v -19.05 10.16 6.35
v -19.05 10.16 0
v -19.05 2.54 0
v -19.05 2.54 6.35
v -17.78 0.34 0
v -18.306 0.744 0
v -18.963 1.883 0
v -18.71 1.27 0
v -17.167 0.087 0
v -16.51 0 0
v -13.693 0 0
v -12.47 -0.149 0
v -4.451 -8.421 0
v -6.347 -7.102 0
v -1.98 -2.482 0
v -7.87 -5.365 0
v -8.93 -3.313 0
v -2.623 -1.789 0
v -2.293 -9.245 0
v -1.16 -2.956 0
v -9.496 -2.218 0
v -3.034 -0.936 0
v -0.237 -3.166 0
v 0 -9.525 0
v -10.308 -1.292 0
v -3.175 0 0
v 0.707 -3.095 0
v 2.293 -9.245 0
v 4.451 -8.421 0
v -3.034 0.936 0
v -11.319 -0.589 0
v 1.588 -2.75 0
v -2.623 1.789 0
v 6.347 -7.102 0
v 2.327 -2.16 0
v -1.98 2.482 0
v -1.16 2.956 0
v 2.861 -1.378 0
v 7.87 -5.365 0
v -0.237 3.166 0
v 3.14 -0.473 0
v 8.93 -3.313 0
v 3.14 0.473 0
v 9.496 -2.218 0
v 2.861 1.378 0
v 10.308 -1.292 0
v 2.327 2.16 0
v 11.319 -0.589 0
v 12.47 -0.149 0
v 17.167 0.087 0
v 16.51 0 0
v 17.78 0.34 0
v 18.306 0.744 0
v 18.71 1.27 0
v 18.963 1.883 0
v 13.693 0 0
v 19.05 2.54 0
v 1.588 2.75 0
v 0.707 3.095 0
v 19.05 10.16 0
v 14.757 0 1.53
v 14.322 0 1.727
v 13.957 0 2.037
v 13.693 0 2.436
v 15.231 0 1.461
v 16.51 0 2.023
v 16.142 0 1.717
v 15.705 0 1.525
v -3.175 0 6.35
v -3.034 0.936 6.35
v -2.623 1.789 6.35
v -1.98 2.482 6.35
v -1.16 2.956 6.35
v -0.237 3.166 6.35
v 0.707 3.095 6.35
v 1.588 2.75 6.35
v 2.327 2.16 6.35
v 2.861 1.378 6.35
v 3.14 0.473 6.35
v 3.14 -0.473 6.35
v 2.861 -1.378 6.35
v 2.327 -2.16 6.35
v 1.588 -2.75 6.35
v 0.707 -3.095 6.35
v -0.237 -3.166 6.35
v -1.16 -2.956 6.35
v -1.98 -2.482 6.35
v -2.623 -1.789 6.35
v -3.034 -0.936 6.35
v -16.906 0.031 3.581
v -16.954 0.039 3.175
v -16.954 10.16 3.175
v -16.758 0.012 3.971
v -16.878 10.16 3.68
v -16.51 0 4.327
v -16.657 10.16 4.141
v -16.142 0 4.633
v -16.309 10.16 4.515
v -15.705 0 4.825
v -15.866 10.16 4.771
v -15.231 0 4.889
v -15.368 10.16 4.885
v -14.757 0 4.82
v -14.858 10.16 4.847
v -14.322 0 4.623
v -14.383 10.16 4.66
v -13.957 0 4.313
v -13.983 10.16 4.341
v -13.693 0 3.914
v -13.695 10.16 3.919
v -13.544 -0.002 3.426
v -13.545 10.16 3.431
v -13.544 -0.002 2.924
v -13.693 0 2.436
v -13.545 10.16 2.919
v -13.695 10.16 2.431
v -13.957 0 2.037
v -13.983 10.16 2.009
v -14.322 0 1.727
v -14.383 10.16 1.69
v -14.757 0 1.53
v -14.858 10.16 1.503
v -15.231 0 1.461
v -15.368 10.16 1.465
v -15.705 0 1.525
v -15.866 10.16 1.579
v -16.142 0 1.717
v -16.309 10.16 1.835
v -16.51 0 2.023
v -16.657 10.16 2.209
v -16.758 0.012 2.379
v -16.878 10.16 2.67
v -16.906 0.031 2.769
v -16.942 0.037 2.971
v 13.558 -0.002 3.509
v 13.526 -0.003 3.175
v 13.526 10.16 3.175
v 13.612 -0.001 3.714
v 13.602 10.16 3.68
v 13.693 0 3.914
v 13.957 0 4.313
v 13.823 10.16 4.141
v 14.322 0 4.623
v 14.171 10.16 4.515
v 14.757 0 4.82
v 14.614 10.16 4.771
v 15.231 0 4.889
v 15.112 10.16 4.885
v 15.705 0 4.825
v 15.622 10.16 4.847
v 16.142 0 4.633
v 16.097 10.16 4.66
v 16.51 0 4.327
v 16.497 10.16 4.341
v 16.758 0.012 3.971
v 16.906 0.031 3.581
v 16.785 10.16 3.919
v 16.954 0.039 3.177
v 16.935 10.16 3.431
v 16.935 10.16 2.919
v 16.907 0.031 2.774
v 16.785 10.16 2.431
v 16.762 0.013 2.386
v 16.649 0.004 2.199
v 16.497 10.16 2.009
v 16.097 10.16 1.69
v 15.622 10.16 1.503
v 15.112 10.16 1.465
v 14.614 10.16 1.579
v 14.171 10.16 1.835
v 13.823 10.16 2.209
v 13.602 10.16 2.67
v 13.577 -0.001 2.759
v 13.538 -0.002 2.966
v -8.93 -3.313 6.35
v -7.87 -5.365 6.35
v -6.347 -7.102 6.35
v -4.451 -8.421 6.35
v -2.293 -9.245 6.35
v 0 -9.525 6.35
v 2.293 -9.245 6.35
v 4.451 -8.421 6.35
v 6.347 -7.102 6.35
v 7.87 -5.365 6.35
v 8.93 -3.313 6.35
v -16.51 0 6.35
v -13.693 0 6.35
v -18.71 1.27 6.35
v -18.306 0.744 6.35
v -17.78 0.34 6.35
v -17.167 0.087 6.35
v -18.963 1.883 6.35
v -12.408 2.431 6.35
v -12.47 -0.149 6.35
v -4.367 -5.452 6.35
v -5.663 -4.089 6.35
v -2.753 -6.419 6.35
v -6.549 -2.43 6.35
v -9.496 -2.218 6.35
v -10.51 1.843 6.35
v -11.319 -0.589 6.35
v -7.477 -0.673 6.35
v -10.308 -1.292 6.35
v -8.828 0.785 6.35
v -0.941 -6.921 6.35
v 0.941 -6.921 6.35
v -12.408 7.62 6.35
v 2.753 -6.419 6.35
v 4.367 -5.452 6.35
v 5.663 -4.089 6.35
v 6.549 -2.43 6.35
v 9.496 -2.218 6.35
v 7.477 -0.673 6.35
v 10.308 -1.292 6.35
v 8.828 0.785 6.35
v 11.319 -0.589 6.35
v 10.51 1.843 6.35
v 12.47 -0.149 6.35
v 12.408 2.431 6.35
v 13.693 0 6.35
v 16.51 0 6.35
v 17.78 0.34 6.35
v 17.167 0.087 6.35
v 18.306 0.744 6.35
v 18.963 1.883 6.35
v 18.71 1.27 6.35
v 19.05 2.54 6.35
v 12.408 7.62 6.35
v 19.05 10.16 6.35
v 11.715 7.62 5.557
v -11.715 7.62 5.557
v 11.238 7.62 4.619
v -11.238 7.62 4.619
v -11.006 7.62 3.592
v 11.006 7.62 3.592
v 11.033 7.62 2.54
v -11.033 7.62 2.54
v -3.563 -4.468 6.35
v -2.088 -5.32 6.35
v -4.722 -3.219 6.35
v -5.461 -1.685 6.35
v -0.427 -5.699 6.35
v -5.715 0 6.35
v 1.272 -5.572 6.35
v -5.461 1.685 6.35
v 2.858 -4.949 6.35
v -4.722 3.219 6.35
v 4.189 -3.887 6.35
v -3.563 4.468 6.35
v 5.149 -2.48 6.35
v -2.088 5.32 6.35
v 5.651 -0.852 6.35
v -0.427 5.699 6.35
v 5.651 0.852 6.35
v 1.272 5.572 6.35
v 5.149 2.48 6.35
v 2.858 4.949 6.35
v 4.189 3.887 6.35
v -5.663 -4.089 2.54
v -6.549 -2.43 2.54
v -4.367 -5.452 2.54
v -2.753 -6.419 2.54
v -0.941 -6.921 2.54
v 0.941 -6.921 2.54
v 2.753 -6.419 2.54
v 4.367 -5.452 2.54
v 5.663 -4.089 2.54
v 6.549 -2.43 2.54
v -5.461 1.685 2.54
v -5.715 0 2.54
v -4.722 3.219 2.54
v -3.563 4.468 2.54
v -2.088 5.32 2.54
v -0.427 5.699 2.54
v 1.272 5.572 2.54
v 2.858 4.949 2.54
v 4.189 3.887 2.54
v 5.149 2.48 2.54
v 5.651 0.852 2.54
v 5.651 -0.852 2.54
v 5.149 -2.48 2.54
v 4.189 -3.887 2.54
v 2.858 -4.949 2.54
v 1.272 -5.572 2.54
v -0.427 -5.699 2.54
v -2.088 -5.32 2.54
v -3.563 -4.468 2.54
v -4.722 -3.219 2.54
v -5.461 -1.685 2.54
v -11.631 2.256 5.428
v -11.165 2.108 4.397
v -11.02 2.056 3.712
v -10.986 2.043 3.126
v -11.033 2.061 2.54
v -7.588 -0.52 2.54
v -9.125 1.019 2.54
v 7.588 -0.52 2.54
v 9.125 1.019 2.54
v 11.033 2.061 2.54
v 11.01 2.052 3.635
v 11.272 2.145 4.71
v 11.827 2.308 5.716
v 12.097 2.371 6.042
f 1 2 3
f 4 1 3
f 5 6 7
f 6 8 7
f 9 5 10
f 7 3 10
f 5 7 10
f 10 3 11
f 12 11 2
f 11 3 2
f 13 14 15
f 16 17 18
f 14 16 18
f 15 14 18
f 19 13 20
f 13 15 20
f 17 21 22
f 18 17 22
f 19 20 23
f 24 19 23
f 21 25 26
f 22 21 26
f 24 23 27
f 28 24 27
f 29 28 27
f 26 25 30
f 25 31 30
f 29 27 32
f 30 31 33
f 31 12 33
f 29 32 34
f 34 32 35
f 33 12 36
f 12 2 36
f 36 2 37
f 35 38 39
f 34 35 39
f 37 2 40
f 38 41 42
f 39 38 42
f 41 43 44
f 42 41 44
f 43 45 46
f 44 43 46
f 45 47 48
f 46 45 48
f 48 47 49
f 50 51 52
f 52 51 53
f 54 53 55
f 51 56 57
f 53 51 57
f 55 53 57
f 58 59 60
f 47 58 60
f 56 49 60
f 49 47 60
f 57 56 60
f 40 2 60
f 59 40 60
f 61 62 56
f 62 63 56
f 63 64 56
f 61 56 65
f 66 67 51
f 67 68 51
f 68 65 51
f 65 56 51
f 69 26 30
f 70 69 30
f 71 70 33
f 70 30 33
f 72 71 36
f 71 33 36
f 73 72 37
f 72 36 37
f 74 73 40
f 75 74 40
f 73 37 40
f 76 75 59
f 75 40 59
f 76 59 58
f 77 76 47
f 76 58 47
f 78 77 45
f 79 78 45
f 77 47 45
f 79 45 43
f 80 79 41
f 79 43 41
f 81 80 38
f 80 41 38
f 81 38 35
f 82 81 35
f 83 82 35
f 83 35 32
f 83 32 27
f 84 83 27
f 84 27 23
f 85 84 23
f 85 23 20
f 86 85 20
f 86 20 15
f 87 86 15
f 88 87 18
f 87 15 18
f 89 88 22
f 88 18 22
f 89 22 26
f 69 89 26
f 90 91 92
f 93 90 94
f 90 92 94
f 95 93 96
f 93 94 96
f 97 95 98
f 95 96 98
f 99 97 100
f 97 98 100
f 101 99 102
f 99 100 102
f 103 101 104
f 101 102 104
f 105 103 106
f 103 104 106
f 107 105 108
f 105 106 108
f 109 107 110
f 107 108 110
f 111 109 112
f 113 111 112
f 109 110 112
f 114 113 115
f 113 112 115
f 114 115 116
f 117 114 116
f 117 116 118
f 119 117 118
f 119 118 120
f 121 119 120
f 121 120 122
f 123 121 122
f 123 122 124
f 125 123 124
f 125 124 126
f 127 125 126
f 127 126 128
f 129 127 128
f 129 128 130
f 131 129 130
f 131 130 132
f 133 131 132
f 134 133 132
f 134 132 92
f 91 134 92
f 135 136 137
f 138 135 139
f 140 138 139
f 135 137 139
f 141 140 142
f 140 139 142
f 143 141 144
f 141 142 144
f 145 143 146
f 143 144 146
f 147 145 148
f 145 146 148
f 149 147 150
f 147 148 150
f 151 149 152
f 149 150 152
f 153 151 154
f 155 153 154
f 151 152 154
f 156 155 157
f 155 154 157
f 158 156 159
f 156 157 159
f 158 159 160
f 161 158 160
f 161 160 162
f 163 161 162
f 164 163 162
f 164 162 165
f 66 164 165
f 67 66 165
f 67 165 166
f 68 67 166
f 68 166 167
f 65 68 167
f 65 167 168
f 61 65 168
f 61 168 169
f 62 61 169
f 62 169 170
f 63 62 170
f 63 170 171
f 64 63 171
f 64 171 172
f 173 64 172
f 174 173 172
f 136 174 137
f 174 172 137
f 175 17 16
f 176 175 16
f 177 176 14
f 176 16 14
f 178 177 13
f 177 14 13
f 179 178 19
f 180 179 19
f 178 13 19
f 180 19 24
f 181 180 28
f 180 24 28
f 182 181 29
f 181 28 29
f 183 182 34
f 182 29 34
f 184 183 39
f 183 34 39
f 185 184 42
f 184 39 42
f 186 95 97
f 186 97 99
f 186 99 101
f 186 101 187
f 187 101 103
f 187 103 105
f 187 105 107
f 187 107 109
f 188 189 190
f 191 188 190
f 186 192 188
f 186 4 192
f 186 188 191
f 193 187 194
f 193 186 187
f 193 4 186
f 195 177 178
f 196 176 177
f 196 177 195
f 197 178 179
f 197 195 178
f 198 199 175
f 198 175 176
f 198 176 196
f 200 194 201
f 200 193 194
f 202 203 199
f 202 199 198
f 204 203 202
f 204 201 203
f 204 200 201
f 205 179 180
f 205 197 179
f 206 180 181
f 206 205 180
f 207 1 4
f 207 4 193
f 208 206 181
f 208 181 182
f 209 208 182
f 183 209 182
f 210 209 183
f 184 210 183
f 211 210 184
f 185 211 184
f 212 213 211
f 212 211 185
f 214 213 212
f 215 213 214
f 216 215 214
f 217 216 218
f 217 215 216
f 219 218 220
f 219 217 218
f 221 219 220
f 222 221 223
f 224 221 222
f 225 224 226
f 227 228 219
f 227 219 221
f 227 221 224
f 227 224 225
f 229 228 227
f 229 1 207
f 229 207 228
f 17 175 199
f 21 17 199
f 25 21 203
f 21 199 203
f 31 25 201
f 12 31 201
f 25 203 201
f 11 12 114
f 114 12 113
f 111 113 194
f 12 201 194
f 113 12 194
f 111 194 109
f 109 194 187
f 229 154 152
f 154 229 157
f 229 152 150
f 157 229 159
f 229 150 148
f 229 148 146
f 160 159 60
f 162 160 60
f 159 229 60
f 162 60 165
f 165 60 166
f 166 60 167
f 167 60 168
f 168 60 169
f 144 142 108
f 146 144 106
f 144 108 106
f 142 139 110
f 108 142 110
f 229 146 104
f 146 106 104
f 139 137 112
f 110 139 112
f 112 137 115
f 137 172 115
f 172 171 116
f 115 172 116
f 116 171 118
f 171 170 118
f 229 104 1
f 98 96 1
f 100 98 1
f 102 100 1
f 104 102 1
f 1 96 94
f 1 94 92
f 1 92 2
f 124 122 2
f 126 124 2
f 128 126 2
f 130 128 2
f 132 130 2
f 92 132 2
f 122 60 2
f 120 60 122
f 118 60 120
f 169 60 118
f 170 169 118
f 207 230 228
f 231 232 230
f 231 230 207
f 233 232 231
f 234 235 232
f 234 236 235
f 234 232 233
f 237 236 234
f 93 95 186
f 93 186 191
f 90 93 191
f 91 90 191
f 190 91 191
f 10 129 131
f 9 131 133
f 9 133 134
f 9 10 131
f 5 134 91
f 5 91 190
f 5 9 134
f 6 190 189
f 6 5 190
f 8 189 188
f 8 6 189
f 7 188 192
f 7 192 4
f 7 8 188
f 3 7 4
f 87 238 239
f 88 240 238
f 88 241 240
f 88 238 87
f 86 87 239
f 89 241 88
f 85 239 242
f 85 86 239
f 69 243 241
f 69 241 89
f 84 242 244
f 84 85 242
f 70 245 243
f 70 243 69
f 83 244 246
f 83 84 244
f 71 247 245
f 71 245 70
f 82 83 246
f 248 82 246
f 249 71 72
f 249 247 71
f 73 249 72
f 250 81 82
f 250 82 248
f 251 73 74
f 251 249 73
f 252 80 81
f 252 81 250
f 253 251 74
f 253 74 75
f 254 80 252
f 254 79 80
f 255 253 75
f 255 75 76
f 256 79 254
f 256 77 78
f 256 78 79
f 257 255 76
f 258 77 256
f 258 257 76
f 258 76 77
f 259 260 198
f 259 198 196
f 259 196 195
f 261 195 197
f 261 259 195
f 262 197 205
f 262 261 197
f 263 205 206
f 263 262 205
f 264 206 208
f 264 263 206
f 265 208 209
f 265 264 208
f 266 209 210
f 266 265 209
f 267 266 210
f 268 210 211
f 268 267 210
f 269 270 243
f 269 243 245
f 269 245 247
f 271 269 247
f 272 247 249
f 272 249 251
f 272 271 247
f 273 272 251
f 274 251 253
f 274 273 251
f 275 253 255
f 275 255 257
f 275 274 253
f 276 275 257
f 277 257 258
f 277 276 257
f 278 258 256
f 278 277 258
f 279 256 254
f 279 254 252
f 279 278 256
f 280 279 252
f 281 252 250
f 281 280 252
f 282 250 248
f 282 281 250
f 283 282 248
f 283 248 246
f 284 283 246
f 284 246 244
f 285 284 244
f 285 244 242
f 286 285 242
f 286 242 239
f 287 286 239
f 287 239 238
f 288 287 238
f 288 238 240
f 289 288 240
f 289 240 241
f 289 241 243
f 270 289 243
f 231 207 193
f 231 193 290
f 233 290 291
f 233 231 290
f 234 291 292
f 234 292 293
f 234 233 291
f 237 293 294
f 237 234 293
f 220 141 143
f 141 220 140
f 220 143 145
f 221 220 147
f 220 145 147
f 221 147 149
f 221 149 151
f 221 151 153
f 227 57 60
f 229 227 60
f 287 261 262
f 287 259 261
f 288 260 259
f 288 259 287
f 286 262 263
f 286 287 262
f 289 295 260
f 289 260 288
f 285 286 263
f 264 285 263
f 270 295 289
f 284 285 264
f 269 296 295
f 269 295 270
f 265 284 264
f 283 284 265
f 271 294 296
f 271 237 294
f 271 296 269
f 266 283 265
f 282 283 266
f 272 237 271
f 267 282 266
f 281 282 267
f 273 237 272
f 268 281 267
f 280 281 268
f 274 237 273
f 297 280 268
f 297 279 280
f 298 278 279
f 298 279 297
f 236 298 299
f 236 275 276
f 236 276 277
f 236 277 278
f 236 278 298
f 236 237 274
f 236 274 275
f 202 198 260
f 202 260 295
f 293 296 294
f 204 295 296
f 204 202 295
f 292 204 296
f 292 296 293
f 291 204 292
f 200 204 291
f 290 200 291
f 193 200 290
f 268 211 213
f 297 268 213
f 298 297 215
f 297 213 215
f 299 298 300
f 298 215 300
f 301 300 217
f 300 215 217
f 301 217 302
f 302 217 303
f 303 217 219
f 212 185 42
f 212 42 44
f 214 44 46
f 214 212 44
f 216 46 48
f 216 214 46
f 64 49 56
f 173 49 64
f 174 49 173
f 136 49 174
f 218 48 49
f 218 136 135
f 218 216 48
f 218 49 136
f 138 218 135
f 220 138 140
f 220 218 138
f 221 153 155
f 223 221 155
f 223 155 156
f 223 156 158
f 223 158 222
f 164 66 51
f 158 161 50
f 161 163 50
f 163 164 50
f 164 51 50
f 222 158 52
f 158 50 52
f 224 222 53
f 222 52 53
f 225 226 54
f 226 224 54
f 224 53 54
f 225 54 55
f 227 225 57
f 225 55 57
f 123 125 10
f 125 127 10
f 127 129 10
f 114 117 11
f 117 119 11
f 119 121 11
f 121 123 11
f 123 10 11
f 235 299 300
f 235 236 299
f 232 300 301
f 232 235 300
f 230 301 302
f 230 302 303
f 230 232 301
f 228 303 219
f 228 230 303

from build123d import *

# Parameters (mm, degrees)
F1_DEPTH    = 6.35
F2_R        = 5.08
F3_R        = 1.7145
F5_DEPTH    = 19.686
F6_T        = 2.54
F7_T1_DEPTH = 19.05


# Not quite as in the source:
# - a fillet or chamfer that OpenCascade refuses, or shapes differently, is made with other operations: its cross-section is extruded or revolved along the edge and cut away or added
# - a shell that OpenCascade refuses in one call is made with other operations: the cavity is built on its own and cut out
# - a feature names something its author has since deleted; it is built from what else it names


with BuildPart() as f1:
    # F0 (on Top) → F1 (new body)
    with BuildSketch(Plane.XY):
        with BuildLine():
            Line((9.525, 0), (3.175, 0))
            ThreePointArc((3.175, 0), (0, -3.175), (-3.175, 0))
            Line((-3.175, 0), (-9.525, 0))
            ThreePointArc((-9.525, 0), (0, -9.525), (9.525, 0))
        make_face()
        with BuildLine():
            ThreePointArc((-3.175, 0), (0, 3.175), (3.175, 0))
            Line((3.175, 0), (9.525, 0))
            ThreePointArc((9.525, 0), (0, 9.525), (-9.525, 0))
            Line((-9.525, 0), (-3.175, 0))
        make_face()
        with BuildLine():
            ThreePointArc((-9.525, 0), (0, 9.525), (9.525, 0))
            Line((9.525, 0), (19.05, 0))
            Line((19.05, 0), (19.05, 10.16))
            Line((19.05, 10.16), (-19.05, 10.16))
            Line((-19.05, 10.16), (-19.05, 0))
            Line((-19.05, 0), (-9.525, 0))
        make_face()
    extrude(amount=F1_DEPTH)

    # F2
    f2_edges = [f1.edges().sort_by_distance(p)[0] for p in [
        (9.525, 0, 3.175),
        (-9.525, 0, 3.175),
    ]]
    fillet(f2_edges, radius=F2_R)

    # F3 (on face) → F5 (cut, through all)
    with BuildSketch(Plane(origin=(0, 10.16, 0), x_dir=(-1, 0, 0), z_dir=(0, 1, 0))):
        with Locations((15.24, 3.175)):
            Circle(F3_R)
        with Locations((-15.24, 3.175)):
            Circle(F3_R)
    extrude(amount=-F5_DEPTH, mode=Mode.SUBTRACT)

    # F6: shell of thickness 2.54, made by hand


with BuildPart() as f6_core1:
    # F6_t2: copy of F1
    add(f1.part)

    # the walls: a layer under each face that stays
    f6_faces = [f6_core1.faces().sort_by_distance(p)[0] for p in [
        (0, -9.525, 3.175),
        (-12.7, 0.3175, 0),
        (-10.7921658217, -0.9097158891, 3.175),
        (10.7921658217, -0.9097158891, 3.175),
        (-18.1571750408, 0, 5.2916666667),
        (14.5858752038, 0, 5.2916666667),
        (-19.05, 5.08, 3.175),
        (19.05, 5.08, 3.175),
        (0, 10.16, 3.175),
        (3.175, 0, 3.175),
        (-13.5255, 5.0786180746, 3.175),
        (16.9545, 5.0786180746, 3.175),
    ]]
    thicken(f6_faces, amount=-F6_T, mode=Mode.SUBTRACT)


with BuildPart() as f1_1:
    add(f1.part)

    # what is left inside the walls is the cavity
    f6_cavity = [f6_core1.part.solids().sort_by_distance(p)[0] for p in [
        (-6.204007, 2.751667, 6.3246),
    ]]
    add(f6_cavity, mode=Mode.SUBTRACT)

    # F7: fillet of radius 2.54 on 2 edges, made by hand

    # F7_s2 → F7_t1 (cut)
    with BuildSketch(Plane.XY.offset(-6.35)):
        with BuildLine():
            ThreePointArc((-16.51, 0), (-18.3060512242, 0.7439487758), (-19.05, 2.54))
            Line((-19.05, 2.54), (-19.05, 0))
            Line((-19.05, 0), (-16.51, 0))
        make_face()
        with BuildLine():
            ThreePointArc((16.51, 0), (18.3060512242, 0.7439487758), (19.05, 2.54))
            Line((19.05, 2.54), (19.05, 0))
            Line((19.05, 0), (16.51, 0))
        make_face()
    extrude(amount=F7_T1_DEPTH, mode=Mode.SUBTRACT)


solid = f1_1.part
